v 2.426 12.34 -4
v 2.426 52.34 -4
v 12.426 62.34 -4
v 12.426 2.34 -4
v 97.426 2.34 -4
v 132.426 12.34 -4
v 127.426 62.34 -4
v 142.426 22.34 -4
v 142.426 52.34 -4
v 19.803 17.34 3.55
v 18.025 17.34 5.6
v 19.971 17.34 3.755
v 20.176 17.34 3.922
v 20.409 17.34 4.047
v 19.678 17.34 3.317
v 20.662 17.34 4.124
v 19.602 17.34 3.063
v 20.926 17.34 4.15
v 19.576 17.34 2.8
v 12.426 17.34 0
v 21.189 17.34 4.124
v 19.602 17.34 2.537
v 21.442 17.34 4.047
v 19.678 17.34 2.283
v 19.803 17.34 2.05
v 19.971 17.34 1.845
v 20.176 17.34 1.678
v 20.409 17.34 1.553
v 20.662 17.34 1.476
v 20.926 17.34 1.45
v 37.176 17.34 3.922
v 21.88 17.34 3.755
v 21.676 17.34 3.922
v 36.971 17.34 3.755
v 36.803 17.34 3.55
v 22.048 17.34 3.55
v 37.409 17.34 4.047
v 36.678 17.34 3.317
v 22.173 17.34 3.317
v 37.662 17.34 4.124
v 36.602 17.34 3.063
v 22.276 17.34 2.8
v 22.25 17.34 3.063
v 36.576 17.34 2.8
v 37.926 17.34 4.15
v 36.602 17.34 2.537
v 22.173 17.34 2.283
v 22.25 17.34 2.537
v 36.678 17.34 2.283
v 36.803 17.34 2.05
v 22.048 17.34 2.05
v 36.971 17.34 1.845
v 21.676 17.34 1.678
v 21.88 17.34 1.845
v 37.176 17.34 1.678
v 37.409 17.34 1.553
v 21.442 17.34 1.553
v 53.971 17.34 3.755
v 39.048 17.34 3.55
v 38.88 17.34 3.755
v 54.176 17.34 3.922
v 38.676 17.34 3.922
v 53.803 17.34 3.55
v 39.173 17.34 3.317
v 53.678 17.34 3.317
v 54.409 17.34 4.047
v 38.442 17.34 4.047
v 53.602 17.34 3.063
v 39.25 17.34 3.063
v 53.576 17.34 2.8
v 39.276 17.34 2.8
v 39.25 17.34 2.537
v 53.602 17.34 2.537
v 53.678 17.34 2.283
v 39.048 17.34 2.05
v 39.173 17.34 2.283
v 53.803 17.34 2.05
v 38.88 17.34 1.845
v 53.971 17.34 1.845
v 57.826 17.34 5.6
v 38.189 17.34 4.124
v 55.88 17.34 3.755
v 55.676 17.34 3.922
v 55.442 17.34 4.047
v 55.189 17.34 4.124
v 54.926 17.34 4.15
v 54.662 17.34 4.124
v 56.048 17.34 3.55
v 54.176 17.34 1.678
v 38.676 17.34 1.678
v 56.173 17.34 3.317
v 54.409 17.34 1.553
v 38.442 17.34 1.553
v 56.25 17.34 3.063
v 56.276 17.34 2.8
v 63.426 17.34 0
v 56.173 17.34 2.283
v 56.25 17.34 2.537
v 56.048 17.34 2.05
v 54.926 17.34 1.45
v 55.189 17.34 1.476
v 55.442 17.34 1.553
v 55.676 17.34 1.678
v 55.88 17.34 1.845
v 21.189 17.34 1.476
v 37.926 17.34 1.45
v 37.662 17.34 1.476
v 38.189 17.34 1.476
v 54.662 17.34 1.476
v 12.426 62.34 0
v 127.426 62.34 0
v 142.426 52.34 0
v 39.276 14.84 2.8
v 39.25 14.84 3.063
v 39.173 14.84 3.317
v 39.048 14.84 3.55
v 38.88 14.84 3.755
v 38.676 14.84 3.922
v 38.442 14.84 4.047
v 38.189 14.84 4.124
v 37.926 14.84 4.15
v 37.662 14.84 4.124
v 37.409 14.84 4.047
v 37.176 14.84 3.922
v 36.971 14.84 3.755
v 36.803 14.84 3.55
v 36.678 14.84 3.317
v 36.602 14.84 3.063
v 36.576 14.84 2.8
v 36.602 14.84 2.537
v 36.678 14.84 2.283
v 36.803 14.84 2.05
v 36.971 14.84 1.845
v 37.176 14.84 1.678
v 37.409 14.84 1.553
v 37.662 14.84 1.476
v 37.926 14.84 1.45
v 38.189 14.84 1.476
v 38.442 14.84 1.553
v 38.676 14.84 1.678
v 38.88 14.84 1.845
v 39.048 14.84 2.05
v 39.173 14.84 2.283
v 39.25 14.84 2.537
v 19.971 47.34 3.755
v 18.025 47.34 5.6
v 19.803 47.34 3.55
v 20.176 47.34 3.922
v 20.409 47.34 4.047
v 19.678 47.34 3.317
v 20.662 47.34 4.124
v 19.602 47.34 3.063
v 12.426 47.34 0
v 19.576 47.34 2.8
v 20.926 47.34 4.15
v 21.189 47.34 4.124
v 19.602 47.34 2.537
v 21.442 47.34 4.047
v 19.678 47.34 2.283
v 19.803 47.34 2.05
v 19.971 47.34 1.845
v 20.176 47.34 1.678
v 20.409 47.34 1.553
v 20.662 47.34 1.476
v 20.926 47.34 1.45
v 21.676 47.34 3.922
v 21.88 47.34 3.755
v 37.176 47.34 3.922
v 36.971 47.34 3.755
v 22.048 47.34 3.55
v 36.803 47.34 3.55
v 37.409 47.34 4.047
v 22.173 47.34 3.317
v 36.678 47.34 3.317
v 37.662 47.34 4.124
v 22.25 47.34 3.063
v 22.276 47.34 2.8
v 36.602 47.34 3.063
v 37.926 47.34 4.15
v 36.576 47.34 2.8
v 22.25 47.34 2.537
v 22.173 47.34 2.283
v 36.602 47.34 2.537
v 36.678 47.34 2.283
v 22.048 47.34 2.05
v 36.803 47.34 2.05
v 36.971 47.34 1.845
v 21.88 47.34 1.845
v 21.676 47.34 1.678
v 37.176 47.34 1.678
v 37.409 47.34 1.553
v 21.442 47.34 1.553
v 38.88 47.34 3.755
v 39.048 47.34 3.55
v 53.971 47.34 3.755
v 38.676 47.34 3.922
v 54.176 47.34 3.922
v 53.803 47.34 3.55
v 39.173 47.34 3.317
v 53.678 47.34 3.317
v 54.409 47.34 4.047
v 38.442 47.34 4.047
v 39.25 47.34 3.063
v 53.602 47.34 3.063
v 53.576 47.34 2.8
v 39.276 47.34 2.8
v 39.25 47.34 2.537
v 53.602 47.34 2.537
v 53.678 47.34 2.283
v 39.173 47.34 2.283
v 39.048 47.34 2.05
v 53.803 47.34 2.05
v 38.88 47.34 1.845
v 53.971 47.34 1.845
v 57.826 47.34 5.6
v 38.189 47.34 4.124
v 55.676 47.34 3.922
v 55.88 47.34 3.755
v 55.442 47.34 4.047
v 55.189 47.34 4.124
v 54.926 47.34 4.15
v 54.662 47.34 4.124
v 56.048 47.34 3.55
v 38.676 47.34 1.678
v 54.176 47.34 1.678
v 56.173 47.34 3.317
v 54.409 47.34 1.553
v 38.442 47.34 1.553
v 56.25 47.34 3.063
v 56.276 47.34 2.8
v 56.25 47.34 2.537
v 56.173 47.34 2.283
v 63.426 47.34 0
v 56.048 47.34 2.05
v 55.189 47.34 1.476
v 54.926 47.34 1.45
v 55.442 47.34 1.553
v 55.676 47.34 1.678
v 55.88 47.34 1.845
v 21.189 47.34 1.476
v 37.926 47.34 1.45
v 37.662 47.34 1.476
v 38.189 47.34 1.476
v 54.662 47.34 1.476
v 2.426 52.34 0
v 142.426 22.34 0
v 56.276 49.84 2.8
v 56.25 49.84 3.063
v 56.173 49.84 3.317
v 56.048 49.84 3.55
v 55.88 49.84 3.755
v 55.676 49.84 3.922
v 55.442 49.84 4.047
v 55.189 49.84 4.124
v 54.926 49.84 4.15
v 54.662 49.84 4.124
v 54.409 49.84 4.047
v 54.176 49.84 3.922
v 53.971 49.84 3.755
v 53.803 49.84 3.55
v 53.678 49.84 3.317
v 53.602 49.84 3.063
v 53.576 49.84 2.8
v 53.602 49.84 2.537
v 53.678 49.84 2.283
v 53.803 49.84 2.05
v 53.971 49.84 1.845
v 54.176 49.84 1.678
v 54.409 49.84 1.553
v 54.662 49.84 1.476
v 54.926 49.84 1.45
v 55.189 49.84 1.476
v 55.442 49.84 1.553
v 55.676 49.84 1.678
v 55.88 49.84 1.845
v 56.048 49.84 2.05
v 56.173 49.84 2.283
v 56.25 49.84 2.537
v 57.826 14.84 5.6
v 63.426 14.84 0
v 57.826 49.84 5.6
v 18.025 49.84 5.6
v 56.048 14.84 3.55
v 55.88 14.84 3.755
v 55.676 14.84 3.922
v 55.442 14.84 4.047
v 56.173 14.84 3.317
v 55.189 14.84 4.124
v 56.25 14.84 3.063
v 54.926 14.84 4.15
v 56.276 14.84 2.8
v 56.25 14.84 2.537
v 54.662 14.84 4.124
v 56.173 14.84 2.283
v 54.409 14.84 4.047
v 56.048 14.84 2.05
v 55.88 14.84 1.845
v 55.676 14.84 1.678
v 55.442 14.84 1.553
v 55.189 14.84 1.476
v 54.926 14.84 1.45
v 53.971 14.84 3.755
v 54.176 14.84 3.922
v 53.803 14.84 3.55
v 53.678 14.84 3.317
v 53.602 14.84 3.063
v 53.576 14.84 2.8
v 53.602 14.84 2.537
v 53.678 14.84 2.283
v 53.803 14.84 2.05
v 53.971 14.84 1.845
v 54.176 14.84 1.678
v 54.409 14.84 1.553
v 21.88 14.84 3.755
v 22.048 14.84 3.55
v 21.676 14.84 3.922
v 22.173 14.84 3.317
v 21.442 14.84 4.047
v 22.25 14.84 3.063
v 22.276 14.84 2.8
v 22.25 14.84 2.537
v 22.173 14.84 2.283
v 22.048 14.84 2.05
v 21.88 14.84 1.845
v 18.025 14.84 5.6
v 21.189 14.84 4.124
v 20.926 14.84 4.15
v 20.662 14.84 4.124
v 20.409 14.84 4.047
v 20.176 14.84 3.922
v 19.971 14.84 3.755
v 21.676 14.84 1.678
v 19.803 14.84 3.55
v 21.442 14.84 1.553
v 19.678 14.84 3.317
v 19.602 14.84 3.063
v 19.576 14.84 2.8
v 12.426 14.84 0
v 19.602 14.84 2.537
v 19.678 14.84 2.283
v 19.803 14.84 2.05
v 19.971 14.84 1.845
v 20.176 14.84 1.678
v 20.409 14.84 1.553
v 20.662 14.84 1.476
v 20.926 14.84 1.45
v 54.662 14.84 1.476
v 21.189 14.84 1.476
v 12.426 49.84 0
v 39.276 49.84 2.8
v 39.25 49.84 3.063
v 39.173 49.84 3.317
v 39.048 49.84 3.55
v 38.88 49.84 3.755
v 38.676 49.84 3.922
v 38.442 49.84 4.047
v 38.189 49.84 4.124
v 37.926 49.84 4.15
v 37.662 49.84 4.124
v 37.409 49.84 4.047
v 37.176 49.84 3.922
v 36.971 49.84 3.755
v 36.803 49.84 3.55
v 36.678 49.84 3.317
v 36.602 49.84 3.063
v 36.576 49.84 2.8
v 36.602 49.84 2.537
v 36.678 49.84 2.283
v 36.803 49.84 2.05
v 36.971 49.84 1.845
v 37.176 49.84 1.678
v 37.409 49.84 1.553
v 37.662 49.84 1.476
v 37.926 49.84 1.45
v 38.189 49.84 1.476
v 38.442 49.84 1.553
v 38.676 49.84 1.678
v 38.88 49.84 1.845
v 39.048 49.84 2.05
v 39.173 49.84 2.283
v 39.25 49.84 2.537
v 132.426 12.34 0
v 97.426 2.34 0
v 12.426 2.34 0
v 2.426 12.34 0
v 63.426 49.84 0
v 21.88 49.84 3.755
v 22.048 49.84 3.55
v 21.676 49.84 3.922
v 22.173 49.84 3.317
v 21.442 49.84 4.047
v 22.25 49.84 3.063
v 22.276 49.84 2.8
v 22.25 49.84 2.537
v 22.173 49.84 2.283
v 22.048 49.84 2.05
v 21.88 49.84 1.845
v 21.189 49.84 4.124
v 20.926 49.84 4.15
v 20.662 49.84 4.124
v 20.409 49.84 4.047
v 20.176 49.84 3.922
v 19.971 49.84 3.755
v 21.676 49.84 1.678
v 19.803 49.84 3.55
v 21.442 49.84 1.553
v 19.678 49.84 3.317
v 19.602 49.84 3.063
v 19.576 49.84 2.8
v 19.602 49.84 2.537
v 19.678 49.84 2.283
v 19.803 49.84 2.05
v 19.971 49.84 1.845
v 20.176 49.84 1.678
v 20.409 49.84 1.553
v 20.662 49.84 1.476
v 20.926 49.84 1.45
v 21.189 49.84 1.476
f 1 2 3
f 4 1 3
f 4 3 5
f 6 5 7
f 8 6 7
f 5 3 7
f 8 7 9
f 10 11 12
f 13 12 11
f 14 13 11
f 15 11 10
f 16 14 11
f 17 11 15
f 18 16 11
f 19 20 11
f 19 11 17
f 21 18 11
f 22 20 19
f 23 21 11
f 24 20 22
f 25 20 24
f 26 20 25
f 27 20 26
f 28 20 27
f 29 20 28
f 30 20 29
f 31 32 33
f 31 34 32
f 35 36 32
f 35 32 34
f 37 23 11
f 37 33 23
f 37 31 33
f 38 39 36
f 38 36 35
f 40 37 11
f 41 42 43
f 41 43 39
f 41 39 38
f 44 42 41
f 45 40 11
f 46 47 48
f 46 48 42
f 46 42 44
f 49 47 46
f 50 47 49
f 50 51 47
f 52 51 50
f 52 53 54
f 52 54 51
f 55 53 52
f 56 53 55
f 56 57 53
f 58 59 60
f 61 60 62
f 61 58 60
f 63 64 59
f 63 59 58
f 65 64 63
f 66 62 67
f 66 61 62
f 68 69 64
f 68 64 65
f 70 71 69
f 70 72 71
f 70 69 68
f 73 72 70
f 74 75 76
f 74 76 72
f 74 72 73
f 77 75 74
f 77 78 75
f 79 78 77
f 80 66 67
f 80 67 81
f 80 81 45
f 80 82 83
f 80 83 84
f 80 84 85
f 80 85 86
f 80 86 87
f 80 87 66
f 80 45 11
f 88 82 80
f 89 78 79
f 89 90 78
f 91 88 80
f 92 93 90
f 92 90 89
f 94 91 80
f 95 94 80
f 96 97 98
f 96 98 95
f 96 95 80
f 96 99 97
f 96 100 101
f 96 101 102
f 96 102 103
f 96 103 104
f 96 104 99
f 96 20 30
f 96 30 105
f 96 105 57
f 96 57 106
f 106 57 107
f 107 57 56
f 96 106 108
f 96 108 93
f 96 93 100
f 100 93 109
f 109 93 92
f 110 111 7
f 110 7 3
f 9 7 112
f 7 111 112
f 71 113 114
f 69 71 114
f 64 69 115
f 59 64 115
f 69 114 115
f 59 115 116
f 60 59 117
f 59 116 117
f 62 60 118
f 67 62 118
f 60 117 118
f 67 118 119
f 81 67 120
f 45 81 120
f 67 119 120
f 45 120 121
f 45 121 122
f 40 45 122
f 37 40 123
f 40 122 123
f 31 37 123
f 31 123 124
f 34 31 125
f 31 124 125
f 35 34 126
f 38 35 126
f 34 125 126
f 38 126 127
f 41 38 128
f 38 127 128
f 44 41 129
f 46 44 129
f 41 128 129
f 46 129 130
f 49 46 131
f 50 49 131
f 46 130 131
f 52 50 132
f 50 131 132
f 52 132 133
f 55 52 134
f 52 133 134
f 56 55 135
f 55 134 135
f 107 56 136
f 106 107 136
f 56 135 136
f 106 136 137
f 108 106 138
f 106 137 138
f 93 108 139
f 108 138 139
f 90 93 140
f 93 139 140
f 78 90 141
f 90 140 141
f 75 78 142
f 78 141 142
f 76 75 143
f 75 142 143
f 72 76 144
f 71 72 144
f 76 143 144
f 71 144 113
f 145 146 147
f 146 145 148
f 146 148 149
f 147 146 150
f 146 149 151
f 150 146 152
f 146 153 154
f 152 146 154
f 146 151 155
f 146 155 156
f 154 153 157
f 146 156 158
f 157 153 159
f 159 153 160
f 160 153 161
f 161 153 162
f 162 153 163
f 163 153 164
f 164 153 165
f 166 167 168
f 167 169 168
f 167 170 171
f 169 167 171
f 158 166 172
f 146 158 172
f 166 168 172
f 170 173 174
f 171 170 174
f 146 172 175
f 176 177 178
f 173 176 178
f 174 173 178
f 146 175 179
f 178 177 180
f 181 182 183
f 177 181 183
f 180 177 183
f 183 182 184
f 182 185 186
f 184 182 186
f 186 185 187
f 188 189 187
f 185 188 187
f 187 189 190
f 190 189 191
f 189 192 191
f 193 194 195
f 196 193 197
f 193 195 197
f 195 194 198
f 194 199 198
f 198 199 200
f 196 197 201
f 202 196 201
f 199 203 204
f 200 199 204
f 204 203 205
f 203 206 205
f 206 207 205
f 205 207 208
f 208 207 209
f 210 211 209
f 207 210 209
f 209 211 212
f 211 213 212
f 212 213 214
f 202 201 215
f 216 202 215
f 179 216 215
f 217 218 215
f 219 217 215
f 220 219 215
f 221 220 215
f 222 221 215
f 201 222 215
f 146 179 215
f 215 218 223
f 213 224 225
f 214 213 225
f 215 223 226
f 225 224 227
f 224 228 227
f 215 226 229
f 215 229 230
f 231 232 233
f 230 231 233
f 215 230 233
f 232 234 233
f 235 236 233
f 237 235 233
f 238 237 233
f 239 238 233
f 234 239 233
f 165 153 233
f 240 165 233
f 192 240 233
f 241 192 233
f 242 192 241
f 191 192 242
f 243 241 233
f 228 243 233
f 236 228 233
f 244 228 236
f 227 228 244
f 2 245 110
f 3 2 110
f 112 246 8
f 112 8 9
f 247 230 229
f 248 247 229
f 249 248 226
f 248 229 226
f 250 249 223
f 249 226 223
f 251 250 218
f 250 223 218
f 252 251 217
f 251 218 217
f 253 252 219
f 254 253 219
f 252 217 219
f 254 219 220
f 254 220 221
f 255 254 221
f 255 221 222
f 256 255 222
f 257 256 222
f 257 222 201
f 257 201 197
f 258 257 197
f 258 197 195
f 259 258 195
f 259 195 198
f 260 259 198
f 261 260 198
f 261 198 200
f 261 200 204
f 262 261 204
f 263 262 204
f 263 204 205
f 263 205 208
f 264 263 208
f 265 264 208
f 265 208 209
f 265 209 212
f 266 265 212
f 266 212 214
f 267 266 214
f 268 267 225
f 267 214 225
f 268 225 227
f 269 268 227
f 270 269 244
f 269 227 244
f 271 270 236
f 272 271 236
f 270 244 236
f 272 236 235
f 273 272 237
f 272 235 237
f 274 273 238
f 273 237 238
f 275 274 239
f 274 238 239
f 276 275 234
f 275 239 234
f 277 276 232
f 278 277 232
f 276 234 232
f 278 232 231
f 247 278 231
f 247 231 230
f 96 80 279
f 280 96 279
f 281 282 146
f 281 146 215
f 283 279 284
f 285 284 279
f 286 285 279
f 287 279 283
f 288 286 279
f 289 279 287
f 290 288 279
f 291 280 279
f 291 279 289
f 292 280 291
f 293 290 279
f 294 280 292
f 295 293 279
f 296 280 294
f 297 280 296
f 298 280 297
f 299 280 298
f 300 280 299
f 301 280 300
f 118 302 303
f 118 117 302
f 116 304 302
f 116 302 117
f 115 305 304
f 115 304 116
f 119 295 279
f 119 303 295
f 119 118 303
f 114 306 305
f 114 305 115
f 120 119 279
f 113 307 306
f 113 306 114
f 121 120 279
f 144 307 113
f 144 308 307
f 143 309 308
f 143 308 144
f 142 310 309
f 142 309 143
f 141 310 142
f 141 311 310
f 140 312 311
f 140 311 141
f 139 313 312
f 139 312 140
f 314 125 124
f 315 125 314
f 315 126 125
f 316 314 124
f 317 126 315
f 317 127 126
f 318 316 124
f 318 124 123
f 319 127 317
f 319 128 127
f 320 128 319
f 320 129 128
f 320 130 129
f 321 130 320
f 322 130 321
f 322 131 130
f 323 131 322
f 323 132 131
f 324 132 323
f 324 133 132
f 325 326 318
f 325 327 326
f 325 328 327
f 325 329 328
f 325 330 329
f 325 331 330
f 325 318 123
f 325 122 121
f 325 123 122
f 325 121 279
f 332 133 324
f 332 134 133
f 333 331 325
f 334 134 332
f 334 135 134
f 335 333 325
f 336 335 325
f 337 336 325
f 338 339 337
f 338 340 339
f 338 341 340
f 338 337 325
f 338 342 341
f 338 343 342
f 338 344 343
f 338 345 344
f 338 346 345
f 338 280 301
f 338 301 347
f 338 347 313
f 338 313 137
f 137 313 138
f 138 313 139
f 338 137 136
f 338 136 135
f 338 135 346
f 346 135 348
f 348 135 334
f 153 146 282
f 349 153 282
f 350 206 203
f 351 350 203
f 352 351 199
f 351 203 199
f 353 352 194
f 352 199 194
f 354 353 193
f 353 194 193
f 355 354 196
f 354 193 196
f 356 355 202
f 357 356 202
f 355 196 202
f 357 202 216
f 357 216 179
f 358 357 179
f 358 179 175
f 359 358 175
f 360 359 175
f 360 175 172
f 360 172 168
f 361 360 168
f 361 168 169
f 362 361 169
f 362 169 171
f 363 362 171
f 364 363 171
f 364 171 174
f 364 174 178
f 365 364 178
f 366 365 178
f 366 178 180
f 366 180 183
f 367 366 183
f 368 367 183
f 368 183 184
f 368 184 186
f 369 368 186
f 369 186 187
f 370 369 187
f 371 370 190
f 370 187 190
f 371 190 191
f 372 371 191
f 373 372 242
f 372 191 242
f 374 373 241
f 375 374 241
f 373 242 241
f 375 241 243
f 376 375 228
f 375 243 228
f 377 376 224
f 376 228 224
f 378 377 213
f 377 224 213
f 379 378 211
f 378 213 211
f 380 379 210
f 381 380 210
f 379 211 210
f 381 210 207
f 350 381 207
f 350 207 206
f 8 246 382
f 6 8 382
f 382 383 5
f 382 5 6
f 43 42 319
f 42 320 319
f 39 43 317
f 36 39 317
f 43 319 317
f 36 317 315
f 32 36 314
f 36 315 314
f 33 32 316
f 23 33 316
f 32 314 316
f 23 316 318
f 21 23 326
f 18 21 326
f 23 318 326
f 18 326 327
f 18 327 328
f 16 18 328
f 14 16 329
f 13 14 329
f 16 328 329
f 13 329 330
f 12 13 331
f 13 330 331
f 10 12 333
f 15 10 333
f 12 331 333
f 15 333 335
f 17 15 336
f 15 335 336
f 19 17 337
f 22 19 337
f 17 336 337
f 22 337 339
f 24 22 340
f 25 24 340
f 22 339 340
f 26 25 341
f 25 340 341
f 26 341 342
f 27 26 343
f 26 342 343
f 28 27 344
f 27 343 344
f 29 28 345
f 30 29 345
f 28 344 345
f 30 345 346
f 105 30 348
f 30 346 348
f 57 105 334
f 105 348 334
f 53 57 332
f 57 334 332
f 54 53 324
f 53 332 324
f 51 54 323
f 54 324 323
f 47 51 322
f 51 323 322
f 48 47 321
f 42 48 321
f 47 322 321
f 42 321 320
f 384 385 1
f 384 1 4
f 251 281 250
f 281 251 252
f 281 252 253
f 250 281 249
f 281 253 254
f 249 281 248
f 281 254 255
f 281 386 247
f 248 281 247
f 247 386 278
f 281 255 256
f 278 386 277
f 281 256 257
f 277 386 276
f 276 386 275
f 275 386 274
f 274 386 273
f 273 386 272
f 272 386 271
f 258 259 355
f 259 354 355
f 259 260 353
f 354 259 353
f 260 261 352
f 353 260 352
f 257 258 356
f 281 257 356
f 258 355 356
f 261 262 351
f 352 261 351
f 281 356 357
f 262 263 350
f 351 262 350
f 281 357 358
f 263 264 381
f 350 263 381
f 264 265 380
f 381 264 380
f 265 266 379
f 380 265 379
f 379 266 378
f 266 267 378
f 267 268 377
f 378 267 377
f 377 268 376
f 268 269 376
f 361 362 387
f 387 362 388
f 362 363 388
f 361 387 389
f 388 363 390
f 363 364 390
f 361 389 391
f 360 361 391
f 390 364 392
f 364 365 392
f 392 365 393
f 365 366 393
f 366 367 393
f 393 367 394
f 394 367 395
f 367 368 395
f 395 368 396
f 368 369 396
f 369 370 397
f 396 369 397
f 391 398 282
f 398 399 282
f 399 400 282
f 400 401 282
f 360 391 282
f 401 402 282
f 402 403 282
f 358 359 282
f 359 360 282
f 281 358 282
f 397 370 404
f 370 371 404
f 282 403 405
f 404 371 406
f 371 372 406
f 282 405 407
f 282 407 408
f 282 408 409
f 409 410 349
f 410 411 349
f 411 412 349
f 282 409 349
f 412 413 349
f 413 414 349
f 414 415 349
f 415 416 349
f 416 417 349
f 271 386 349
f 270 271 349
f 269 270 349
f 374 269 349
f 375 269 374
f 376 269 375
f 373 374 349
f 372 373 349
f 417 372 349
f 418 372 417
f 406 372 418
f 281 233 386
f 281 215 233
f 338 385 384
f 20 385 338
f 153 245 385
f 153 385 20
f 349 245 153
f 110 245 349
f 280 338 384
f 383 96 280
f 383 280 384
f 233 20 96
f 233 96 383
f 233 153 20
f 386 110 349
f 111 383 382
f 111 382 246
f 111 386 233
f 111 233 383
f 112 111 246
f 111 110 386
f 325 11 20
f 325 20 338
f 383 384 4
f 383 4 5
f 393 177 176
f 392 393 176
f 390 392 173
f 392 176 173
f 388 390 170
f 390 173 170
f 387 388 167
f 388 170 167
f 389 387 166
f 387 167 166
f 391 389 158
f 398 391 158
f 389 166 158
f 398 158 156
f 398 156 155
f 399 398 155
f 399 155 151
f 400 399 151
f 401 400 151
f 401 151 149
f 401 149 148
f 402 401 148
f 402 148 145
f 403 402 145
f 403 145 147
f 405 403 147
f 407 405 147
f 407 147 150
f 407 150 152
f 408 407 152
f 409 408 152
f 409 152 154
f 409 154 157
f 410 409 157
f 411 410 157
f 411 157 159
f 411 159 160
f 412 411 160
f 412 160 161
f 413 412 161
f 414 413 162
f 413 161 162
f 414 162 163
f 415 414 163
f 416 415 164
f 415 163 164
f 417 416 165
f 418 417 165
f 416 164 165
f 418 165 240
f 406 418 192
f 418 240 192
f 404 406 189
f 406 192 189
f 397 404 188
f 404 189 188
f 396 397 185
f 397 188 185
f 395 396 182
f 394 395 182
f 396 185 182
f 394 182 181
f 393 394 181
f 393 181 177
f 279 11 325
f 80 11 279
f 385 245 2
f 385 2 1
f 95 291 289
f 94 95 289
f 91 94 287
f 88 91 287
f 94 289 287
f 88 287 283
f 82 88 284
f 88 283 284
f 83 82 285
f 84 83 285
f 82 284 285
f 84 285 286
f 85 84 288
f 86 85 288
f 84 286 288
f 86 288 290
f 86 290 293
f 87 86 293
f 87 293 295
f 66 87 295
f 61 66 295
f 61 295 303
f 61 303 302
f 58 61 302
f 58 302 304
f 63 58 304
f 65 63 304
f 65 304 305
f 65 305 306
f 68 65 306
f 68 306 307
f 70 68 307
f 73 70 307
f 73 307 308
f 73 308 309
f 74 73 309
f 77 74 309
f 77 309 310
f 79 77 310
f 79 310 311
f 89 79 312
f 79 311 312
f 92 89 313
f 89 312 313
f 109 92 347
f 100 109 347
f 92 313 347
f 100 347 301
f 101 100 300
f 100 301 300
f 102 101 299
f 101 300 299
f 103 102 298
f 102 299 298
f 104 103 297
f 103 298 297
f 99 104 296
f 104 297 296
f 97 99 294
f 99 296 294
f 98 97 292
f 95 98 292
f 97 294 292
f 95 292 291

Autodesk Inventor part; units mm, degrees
ref_plane "YZ Plane" through (0, 0, 0) normal (1, 0, 0) x (0, 1, 0)
ref_plane "XZ Plane" through (0, 0, 0) normal (0, 1, 0) x (-1, 0, 0)
ref_plane "XY Plane" through (0, 0, 0) normal (0, 0, 1) x (1, 0, 0)
sketch "Sketch1" plane through (0, 0, 0) normal (0, 0, 1) x (1, 0, 0)
  line L0 (2.4256, 52.3404) -> (2.4256, 12.3404)
  line L1 (12.4256, 2.3404) -> (97.4256, 2.3404)
  line L2 (142.4256, 22.3404) -> (142.4256, 52.3404)
  line L3 (127.4256, 62.3404) -> (12.4256, 62.3404)
  line L4 (2.4256, 52.3404) -> (12.4256, 62.3404)
  line L5 (97.4256, 2.3404) -> (132.4256, 12.3404)
  line L6 (2.4256, 12.3404) -> (12.4256, 2.3404)
  line L7 (142.4256, 22.3404) -> (132.4256, 12.3404)
  line L8 (127.4256, 62.3404) -> (142.4256, 52.3404)
  line L9 (12.4256, 49.8404) -> (12.4256, 47.3404)
  line L10 (63.4256, 49.8404) -> (63.4256, 47.3404)
  line L11 (12.4256, 47.3404) -> (63.4256, 47.3404)
  line L12 (63.4256, 47.3404) -> (63.4256, 49.8404)
  line L13 (63.4256, 49.8404) -> (12.4256, 49.8404)
  line L14 (12.4256, 14.8404) -> (12.4256, 17.3404)
  line L15 (63.4256, 14.8404) -> (63.4256, 17.3404)
  line L16 (12.4256, 17.3404) -> (63.4256, 17.3404)
  line L17 (63.4256, 17.3404) -> (63.4256, 14.8404)
  line L18 (63.4256, 14.8404) -> (12.4256, 14.8404)
  point P0 (0, 0)
  dimension "d14" = 140
  dimension "d15" = 10
  dimension "d16" = 10
  dimension "d17" = 51
  dimension "d18" = 51
extrude "Extrusion1" add sketch "Sketch1" against normal blind 4 contours L4 L3 L8 L2 L7 L5 L1 L6 L0 | L13 L10 L11 L9 | L14 L16 L15 L18
extrude "Extrusion2" add sketch "Sketch1" along normal blind 5.6 contours L13 L10 L11 L9 | L14 L16 L15 L18
sketch "Sketch2" plane through (12.4256, 14.8404, 5.6) normal (0, -1, 0) x (1, 0, 0)
  line L0 (0, -5.6) -> (0, 0) projected
  line L1 (51, -5.6) -> (51, 0) projected
  circle A0 centre (8.5, -2.8) radius 1.35
  circle A1 centre (25.5, -2.8) radius 1.35
  circle A2 centre (42.5, -2.8) radius 1.35
  point P0 (50.8, -5.6)
  point P1 (-12.4256, -5.6)
  dimension "d5" = 2.7
  dimension "d6" = 8.5
  dimension "d7" = 2.7
  dimension "d8" = 2.7
  dimension "d9" = 8.5
  dimension "d10" = 17
extrude "Extrusion3" cut sketch "Sketch2" against normal through all
chamfer "Chamfer1" distance 5.6 angle 45 4 edges at (12.4256, 16.0904, 5.6) (63.4256, 48.5904, 5.6) (63.4256, 16.0904, 5.6) (12.4256, 48.5904, 5.6)
properties part number "Right foot" material "Aluminum-6061"
